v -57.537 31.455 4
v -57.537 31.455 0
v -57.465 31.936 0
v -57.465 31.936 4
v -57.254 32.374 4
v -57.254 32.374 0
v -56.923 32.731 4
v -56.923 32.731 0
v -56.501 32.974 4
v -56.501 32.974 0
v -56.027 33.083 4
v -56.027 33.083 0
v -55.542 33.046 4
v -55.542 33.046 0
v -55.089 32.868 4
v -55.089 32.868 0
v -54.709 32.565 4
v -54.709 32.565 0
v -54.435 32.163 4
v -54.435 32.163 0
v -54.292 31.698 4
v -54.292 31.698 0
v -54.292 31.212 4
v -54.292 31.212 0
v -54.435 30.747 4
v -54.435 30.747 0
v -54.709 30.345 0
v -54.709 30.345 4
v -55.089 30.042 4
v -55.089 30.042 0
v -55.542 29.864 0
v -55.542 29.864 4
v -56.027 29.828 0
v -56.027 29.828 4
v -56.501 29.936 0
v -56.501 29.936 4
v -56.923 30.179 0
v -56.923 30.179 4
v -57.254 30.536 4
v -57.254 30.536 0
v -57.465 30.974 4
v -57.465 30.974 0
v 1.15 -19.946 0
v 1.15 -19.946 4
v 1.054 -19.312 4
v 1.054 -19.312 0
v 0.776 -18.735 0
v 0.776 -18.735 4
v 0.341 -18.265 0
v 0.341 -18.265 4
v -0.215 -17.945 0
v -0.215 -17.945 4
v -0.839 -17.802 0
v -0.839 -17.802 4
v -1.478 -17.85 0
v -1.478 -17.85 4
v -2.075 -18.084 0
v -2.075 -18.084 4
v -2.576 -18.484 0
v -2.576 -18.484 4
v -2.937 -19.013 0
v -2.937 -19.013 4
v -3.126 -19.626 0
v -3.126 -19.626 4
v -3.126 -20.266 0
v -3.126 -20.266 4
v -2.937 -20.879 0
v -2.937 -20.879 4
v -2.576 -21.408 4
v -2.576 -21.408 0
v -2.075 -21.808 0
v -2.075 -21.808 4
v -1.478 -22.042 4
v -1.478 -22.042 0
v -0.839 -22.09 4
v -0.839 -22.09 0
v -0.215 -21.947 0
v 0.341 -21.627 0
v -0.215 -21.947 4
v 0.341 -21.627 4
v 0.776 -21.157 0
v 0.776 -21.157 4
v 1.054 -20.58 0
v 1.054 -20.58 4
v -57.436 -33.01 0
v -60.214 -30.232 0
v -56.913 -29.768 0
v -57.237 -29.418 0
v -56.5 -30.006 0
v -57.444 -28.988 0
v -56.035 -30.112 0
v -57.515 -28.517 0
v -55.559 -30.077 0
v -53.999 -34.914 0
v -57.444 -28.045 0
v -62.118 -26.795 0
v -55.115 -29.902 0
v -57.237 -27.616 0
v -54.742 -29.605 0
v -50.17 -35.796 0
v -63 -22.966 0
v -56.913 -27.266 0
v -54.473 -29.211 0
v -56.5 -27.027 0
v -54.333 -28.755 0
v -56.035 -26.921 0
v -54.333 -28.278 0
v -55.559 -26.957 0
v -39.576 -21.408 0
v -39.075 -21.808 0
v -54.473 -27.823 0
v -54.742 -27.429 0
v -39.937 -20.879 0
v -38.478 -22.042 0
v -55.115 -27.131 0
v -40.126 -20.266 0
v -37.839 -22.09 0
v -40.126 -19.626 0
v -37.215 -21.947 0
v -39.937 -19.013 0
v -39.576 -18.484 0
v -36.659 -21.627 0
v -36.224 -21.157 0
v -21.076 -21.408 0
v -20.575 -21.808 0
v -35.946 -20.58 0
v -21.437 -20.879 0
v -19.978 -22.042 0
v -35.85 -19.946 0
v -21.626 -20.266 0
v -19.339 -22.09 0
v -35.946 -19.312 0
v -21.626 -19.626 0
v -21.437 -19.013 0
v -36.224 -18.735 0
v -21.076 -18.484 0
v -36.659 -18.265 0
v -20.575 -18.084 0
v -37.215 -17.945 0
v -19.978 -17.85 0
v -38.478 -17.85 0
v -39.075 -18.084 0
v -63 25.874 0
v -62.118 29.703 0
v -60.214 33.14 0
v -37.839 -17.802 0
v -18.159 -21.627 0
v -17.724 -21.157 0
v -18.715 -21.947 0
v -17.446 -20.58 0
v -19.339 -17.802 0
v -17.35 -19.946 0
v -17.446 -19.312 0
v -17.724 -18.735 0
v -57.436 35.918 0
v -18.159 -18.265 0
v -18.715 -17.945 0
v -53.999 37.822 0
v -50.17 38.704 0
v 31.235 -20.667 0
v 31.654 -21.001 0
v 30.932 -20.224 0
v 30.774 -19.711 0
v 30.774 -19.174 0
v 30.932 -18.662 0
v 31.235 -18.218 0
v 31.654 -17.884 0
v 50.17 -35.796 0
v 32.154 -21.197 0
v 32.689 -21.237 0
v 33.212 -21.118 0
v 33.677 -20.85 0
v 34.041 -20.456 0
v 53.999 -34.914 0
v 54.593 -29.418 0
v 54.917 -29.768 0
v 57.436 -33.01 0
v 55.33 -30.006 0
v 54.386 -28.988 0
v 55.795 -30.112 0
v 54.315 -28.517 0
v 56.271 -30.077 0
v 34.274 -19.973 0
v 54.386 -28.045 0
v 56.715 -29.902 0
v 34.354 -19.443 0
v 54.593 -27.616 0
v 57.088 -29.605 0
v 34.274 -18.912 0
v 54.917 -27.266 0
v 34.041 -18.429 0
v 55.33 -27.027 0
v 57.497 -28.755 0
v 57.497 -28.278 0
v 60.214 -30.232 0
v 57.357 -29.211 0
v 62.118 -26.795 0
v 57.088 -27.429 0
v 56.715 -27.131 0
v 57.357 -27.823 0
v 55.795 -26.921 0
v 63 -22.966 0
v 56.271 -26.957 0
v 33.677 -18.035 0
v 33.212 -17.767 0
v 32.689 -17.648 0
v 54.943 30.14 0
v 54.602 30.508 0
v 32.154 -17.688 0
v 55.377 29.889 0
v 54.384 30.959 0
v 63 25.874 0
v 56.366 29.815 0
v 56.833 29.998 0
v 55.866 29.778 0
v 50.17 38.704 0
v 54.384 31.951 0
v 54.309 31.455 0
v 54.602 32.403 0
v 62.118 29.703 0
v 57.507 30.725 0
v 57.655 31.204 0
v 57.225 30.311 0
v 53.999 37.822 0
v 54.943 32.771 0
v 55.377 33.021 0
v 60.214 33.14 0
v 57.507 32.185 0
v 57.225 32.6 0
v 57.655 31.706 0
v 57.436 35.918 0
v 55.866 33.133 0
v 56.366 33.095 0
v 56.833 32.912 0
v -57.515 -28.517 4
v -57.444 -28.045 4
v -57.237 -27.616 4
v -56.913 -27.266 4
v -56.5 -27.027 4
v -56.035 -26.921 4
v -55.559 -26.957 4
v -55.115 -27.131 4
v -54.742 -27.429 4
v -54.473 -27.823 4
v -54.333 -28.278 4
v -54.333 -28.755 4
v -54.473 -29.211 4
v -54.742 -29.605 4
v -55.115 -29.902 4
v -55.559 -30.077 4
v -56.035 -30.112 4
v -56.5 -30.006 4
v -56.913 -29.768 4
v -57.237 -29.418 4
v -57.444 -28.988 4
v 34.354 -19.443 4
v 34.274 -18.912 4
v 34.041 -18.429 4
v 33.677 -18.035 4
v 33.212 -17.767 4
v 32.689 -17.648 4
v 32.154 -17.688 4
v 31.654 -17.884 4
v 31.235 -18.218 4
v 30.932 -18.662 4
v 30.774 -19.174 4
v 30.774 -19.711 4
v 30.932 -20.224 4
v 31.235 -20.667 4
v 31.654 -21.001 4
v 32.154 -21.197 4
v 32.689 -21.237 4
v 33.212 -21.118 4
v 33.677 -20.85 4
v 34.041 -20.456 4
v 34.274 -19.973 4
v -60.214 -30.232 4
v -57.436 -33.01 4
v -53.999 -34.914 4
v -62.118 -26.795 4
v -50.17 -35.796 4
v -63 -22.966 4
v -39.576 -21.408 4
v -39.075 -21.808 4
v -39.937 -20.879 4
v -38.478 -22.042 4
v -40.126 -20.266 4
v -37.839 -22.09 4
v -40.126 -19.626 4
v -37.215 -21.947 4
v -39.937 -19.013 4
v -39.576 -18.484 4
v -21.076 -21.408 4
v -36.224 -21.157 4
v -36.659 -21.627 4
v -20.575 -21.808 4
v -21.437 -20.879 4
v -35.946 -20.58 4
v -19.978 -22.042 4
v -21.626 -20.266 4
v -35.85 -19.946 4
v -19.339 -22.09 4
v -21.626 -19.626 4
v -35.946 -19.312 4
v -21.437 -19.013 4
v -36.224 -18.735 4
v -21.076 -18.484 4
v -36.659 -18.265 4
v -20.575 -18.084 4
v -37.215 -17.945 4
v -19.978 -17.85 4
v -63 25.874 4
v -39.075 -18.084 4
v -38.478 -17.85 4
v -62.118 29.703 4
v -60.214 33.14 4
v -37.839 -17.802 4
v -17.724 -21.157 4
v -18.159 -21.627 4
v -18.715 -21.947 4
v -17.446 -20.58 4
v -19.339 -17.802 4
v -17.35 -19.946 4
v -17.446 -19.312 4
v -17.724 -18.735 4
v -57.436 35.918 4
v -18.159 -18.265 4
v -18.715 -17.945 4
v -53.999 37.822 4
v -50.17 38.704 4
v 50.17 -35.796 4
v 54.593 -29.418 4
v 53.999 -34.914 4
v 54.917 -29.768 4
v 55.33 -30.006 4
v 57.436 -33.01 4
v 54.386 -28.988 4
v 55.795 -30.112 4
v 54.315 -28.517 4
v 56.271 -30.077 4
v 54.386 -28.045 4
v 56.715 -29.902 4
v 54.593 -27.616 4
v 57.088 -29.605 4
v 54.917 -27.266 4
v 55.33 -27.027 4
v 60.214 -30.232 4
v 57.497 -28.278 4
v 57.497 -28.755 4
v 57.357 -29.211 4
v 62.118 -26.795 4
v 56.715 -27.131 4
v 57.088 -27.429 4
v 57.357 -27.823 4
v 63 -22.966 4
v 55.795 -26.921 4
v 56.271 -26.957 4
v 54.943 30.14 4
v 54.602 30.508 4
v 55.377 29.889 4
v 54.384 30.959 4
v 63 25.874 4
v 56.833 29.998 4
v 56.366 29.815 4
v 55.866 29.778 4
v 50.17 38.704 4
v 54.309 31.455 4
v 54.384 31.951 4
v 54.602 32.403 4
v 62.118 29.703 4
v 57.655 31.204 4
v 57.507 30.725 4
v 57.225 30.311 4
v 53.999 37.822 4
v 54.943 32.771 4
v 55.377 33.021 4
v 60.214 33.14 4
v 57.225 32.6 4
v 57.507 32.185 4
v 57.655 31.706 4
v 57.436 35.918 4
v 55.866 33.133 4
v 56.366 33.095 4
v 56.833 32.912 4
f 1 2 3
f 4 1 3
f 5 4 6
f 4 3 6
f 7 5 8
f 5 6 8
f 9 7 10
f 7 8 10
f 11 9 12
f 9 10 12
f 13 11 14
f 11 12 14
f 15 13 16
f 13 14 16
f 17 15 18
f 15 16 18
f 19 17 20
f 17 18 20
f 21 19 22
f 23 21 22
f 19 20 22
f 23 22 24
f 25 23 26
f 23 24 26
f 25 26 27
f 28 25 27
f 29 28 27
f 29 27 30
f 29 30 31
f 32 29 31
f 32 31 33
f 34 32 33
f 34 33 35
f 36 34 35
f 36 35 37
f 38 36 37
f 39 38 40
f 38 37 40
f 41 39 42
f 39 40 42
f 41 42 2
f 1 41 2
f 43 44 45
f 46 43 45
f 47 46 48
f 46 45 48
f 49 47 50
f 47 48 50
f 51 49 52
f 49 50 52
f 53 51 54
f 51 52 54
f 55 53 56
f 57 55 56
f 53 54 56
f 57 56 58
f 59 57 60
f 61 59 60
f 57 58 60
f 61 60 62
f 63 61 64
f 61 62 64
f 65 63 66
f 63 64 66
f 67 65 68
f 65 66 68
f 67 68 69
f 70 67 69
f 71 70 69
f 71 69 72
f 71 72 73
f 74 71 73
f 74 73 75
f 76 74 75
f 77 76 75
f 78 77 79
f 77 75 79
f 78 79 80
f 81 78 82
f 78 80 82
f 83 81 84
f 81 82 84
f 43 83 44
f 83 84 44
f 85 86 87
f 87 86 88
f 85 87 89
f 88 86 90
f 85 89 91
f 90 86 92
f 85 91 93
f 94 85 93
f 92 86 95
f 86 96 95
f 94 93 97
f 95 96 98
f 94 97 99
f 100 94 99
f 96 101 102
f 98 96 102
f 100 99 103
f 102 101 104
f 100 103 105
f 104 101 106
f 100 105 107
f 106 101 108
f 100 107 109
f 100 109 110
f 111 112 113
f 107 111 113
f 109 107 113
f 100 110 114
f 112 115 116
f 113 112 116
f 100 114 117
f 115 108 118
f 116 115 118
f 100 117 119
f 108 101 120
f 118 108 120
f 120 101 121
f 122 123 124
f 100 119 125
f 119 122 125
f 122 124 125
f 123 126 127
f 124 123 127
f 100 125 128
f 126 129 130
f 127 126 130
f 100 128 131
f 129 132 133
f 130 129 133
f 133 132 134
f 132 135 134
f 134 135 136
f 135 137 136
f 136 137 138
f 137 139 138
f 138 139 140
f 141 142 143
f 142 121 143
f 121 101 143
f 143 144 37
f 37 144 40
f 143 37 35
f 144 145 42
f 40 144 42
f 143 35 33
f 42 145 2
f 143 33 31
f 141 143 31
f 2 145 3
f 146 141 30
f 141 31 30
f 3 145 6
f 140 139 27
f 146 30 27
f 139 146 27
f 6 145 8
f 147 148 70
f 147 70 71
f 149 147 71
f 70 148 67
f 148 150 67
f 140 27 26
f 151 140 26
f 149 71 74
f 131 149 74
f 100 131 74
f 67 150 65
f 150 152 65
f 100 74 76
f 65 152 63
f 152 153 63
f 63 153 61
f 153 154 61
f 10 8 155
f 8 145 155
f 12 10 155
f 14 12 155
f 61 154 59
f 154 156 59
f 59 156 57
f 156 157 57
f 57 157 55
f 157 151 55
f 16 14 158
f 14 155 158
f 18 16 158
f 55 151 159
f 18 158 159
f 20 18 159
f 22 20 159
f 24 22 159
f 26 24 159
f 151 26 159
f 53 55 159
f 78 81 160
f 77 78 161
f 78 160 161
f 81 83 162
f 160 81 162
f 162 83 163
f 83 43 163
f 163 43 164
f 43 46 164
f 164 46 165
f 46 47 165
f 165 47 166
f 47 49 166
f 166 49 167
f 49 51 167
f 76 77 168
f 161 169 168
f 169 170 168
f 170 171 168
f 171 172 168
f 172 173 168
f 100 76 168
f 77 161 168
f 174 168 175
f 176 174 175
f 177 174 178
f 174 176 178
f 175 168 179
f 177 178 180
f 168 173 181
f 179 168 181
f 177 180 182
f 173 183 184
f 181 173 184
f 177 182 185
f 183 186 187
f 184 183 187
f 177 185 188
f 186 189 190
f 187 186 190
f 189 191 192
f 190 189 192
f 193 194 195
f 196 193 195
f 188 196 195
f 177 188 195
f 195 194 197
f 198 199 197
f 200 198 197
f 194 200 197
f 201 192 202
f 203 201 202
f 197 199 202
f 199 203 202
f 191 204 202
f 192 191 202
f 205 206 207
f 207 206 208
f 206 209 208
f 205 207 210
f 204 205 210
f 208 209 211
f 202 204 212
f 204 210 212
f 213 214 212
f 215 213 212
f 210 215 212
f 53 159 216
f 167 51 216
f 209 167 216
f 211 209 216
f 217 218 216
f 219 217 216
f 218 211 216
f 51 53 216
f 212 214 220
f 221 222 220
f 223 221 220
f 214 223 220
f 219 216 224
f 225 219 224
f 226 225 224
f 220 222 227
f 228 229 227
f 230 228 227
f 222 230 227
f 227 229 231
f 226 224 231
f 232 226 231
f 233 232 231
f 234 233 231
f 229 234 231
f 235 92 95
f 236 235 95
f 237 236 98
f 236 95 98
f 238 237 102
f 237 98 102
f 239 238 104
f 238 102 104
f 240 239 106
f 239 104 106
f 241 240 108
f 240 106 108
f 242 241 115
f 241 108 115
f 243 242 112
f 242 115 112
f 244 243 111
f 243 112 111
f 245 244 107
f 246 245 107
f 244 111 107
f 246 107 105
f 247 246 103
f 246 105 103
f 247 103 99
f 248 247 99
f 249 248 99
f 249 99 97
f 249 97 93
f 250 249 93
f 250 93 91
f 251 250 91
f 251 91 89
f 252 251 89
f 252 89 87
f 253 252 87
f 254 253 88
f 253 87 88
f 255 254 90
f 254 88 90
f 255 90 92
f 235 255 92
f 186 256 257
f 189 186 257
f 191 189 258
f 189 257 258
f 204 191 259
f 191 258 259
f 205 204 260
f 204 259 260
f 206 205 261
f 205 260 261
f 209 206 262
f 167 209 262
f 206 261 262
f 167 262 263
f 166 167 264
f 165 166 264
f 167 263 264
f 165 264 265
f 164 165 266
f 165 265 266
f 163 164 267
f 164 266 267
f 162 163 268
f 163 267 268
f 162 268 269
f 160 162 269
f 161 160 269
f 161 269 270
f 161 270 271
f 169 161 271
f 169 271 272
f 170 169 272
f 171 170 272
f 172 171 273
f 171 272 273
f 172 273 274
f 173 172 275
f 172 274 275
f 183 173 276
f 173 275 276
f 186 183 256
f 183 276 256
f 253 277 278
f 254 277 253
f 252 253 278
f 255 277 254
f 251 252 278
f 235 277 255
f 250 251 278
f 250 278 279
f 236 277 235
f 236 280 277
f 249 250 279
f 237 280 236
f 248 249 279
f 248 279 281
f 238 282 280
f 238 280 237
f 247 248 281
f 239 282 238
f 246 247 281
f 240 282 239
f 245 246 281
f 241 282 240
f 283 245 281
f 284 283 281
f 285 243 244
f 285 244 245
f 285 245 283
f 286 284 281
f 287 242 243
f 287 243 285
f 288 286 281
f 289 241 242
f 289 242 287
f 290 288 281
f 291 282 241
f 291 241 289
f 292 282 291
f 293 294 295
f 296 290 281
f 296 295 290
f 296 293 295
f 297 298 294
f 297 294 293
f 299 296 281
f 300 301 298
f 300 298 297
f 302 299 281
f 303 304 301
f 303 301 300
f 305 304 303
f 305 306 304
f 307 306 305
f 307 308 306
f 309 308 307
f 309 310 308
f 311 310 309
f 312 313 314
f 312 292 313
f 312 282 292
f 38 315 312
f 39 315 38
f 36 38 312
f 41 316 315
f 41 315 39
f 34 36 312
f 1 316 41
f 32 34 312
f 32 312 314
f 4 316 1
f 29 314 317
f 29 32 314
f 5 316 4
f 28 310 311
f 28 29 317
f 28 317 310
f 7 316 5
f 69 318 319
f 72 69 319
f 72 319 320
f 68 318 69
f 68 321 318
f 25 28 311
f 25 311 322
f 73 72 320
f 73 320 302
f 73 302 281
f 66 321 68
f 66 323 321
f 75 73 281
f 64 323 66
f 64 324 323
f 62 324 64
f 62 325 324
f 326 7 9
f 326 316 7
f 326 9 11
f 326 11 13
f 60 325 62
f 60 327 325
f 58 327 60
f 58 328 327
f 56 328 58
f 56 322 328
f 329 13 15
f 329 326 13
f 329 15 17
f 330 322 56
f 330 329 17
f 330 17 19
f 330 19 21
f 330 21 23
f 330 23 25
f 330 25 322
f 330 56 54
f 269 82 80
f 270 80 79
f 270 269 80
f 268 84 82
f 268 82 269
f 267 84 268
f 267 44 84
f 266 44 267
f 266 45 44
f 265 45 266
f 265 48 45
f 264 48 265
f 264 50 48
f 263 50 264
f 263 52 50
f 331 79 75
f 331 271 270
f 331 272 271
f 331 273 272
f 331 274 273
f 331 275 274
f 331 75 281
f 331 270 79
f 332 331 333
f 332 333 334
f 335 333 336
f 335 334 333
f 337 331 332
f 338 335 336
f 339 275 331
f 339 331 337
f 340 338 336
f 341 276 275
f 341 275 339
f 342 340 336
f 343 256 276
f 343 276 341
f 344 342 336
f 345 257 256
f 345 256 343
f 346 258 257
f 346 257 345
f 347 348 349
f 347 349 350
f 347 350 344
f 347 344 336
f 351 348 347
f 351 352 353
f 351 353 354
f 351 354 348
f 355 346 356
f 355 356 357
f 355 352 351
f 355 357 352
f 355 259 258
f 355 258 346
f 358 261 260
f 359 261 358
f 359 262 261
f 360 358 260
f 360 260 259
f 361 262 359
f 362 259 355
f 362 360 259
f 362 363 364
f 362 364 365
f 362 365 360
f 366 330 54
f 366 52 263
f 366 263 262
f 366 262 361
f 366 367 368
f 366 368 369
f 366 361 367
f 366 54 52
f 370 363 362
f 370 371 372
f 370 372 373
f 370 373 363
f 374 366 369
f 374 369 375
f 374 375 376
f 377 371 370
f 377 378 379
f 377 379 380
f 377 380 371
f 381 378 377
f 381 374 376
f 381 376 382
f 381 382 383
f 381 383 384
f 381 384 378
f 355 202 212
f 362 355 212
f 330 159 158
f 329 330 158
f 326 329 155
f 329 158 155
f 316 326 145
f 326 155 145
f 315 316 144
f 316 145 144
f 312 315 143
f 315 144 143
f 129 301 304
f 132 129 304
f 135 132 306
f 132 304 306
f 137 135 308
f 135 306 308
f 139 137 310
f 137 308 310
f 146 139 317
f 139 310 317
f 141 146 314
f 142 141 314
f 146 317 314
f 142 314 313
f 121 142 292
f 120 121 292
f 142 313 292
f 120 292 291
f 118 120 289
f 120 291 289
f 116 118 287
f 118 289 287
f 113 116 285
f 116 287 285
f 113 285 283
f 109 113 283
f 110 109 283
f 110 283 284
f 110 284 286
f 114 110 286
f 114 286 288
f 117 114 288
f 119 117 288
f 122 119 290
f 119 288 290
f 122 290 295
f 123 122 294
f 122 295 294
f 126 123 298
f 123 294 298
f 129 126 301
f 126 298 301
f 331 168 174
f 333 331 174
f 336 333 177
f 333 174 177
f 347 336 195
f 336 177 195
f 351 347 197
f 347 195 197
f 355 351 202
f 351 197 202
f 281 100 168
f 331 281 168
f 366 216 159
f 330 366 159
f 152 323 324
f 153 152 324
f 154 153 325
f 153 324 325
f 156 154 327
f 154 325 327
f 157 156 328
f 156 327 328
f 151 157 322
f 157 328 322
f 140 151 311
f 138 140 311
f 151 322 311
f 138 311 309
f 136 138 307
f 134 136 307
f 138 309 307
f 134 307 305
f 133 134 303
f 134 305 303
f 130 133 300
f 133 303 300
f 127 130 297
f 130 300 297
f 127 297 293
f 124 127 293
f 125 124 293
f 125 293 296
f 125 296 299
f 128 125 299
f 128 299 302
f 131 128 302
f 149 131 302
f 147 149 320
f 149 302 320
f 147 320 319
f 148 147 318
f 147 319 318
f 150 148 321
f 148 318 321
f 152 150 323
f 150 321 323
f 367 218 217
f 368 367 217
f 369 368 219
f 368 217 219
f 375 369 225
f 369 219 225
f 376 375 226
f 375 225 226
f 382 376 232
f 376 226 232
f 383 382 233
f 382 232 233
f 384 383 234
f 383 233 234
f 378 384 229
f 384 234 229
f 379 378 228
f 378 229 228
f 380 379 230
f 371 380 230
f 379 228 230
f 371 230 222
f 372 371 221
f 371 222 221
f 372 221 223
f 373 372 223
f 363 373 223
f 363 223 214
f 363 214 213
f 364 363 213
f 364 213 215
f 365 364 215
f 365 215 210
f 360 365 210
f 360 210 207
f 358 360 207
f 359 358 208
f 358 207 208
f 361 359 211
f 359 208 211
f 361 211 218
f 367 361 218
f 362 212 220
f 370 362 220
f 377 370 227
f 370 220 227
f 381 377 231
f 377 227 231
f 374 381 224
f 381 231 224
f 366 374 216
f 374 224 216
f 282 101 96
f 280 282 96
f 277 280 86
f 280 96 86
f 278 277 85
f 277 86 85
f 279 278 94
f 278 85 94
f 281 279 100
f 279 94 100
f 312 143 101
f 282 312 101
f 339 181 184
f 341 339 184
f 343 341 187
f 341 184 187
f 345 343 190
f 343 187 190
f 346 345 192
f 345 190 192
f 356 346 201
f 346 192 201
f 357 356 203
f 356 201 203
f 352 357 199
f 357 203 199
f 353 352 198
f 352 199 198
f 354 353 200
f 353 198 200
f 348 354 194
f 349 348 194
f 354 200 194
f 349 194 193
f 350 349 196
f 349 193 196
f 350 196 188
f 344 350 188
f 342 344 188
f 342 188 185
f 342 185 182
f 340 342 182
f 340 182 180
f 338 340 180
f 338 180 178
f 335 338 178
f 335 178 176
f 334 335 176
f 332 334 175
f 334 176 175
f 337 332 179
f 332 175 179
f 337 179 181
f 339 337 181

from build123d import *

# Parameters (mm, degrees)
EXTRUDE_1_DEPTH     = 4
SKETCH_2_R          = 2.15
SKETCH_2_R_2        = 1.8
CUT_EXTRUDE_1_DEPTH = 4
SKETCH_3_R          = 1.682371235
SKETCH_3_R_2        = 1.63184694
SKETCH_3_R_3        = 1.6
CUT_EXTRUDE_2_DEPTH = 4


with BuildPart() as part:
    # Эскиз1 → Бобышка-Вытянуть1 (new body)
    with BuildSketch(Plane.XY):
        with BuildLine():
            Line((63, -22.965754466), (63, 25.873855155))
            ThreePointArc((63, 25.873855155), (58.922335459, 34.626385804), (50.169804811, 38.704050345))
            Line((50.169804811, 38.704050345), (-50.169804811, 38.704050345))
            ThreePointArc((-50.169804811, 38.704050345), (-58.922335459, 34.626385804), (-63, 25.873855155))
            Line((-63, 25.873855155), (-63, -22.965754466))
            ThreePointArc((-63, -22.965754466), (-58.922335459, -31.718285114), (-50.169804811, -35.795949655))
            Line((-50.169804811, -35.795949655), (50.169804811, -35.795949655))
            ThreePointArc((50.169804811, -35.795949655), (58.922335459, -31.718285114), (63, -22.965754466))
        make_face()
    extrude(amount=EXTRUDE_1_DEPTH)

    # Эскиз2 → Вырез-Вытянуть1 (cut)
    with BuildSketch(Plane.XY.offset(4)):
        with Locations((-38, -19.945949655)):
            Circle(SKETCH_2_R)
        with Locations((32.554227521, -19.442510909)):
            Circle(SKETCH_2_R_2)
        with Locations((-19.5, -19.945949655)):
            Circle(SKETCH_2_R)
        with Locations((-1, -19.945949655)):
            Circle(SKETCH_2_R)
    extrude(amount=-CUT_EXTRUDE_1_DEPTH, mode=Mode.SUBTRACT)

    # Эскиз3 → Вырез-Вытянуть2 (cut)
    with BuildSketch(Plane(origin=(0, 0, 0), x_dir=(-1, 0, 0), z_dir=(0, 0, -1))):
        with Locations((-55.991619652, 31.455233256)):
            Circle(SKETCH_3_R)
        with Locations((55.90524563, 31.455233256)):
            Circle(SKETCH_3_R_2)
        with Locations((-55.91502671, -28.516824843)):
            Circle(SKETCH_3_R_3)
        with Locations((55.91502671, -28.516824843)):
            Circle(SKETCH_3_R_3)
    extrude(amount=-CUT_EXTRUDE_2_DEPTH, mode=Mode.SUBTRACT)


solid = part.part
